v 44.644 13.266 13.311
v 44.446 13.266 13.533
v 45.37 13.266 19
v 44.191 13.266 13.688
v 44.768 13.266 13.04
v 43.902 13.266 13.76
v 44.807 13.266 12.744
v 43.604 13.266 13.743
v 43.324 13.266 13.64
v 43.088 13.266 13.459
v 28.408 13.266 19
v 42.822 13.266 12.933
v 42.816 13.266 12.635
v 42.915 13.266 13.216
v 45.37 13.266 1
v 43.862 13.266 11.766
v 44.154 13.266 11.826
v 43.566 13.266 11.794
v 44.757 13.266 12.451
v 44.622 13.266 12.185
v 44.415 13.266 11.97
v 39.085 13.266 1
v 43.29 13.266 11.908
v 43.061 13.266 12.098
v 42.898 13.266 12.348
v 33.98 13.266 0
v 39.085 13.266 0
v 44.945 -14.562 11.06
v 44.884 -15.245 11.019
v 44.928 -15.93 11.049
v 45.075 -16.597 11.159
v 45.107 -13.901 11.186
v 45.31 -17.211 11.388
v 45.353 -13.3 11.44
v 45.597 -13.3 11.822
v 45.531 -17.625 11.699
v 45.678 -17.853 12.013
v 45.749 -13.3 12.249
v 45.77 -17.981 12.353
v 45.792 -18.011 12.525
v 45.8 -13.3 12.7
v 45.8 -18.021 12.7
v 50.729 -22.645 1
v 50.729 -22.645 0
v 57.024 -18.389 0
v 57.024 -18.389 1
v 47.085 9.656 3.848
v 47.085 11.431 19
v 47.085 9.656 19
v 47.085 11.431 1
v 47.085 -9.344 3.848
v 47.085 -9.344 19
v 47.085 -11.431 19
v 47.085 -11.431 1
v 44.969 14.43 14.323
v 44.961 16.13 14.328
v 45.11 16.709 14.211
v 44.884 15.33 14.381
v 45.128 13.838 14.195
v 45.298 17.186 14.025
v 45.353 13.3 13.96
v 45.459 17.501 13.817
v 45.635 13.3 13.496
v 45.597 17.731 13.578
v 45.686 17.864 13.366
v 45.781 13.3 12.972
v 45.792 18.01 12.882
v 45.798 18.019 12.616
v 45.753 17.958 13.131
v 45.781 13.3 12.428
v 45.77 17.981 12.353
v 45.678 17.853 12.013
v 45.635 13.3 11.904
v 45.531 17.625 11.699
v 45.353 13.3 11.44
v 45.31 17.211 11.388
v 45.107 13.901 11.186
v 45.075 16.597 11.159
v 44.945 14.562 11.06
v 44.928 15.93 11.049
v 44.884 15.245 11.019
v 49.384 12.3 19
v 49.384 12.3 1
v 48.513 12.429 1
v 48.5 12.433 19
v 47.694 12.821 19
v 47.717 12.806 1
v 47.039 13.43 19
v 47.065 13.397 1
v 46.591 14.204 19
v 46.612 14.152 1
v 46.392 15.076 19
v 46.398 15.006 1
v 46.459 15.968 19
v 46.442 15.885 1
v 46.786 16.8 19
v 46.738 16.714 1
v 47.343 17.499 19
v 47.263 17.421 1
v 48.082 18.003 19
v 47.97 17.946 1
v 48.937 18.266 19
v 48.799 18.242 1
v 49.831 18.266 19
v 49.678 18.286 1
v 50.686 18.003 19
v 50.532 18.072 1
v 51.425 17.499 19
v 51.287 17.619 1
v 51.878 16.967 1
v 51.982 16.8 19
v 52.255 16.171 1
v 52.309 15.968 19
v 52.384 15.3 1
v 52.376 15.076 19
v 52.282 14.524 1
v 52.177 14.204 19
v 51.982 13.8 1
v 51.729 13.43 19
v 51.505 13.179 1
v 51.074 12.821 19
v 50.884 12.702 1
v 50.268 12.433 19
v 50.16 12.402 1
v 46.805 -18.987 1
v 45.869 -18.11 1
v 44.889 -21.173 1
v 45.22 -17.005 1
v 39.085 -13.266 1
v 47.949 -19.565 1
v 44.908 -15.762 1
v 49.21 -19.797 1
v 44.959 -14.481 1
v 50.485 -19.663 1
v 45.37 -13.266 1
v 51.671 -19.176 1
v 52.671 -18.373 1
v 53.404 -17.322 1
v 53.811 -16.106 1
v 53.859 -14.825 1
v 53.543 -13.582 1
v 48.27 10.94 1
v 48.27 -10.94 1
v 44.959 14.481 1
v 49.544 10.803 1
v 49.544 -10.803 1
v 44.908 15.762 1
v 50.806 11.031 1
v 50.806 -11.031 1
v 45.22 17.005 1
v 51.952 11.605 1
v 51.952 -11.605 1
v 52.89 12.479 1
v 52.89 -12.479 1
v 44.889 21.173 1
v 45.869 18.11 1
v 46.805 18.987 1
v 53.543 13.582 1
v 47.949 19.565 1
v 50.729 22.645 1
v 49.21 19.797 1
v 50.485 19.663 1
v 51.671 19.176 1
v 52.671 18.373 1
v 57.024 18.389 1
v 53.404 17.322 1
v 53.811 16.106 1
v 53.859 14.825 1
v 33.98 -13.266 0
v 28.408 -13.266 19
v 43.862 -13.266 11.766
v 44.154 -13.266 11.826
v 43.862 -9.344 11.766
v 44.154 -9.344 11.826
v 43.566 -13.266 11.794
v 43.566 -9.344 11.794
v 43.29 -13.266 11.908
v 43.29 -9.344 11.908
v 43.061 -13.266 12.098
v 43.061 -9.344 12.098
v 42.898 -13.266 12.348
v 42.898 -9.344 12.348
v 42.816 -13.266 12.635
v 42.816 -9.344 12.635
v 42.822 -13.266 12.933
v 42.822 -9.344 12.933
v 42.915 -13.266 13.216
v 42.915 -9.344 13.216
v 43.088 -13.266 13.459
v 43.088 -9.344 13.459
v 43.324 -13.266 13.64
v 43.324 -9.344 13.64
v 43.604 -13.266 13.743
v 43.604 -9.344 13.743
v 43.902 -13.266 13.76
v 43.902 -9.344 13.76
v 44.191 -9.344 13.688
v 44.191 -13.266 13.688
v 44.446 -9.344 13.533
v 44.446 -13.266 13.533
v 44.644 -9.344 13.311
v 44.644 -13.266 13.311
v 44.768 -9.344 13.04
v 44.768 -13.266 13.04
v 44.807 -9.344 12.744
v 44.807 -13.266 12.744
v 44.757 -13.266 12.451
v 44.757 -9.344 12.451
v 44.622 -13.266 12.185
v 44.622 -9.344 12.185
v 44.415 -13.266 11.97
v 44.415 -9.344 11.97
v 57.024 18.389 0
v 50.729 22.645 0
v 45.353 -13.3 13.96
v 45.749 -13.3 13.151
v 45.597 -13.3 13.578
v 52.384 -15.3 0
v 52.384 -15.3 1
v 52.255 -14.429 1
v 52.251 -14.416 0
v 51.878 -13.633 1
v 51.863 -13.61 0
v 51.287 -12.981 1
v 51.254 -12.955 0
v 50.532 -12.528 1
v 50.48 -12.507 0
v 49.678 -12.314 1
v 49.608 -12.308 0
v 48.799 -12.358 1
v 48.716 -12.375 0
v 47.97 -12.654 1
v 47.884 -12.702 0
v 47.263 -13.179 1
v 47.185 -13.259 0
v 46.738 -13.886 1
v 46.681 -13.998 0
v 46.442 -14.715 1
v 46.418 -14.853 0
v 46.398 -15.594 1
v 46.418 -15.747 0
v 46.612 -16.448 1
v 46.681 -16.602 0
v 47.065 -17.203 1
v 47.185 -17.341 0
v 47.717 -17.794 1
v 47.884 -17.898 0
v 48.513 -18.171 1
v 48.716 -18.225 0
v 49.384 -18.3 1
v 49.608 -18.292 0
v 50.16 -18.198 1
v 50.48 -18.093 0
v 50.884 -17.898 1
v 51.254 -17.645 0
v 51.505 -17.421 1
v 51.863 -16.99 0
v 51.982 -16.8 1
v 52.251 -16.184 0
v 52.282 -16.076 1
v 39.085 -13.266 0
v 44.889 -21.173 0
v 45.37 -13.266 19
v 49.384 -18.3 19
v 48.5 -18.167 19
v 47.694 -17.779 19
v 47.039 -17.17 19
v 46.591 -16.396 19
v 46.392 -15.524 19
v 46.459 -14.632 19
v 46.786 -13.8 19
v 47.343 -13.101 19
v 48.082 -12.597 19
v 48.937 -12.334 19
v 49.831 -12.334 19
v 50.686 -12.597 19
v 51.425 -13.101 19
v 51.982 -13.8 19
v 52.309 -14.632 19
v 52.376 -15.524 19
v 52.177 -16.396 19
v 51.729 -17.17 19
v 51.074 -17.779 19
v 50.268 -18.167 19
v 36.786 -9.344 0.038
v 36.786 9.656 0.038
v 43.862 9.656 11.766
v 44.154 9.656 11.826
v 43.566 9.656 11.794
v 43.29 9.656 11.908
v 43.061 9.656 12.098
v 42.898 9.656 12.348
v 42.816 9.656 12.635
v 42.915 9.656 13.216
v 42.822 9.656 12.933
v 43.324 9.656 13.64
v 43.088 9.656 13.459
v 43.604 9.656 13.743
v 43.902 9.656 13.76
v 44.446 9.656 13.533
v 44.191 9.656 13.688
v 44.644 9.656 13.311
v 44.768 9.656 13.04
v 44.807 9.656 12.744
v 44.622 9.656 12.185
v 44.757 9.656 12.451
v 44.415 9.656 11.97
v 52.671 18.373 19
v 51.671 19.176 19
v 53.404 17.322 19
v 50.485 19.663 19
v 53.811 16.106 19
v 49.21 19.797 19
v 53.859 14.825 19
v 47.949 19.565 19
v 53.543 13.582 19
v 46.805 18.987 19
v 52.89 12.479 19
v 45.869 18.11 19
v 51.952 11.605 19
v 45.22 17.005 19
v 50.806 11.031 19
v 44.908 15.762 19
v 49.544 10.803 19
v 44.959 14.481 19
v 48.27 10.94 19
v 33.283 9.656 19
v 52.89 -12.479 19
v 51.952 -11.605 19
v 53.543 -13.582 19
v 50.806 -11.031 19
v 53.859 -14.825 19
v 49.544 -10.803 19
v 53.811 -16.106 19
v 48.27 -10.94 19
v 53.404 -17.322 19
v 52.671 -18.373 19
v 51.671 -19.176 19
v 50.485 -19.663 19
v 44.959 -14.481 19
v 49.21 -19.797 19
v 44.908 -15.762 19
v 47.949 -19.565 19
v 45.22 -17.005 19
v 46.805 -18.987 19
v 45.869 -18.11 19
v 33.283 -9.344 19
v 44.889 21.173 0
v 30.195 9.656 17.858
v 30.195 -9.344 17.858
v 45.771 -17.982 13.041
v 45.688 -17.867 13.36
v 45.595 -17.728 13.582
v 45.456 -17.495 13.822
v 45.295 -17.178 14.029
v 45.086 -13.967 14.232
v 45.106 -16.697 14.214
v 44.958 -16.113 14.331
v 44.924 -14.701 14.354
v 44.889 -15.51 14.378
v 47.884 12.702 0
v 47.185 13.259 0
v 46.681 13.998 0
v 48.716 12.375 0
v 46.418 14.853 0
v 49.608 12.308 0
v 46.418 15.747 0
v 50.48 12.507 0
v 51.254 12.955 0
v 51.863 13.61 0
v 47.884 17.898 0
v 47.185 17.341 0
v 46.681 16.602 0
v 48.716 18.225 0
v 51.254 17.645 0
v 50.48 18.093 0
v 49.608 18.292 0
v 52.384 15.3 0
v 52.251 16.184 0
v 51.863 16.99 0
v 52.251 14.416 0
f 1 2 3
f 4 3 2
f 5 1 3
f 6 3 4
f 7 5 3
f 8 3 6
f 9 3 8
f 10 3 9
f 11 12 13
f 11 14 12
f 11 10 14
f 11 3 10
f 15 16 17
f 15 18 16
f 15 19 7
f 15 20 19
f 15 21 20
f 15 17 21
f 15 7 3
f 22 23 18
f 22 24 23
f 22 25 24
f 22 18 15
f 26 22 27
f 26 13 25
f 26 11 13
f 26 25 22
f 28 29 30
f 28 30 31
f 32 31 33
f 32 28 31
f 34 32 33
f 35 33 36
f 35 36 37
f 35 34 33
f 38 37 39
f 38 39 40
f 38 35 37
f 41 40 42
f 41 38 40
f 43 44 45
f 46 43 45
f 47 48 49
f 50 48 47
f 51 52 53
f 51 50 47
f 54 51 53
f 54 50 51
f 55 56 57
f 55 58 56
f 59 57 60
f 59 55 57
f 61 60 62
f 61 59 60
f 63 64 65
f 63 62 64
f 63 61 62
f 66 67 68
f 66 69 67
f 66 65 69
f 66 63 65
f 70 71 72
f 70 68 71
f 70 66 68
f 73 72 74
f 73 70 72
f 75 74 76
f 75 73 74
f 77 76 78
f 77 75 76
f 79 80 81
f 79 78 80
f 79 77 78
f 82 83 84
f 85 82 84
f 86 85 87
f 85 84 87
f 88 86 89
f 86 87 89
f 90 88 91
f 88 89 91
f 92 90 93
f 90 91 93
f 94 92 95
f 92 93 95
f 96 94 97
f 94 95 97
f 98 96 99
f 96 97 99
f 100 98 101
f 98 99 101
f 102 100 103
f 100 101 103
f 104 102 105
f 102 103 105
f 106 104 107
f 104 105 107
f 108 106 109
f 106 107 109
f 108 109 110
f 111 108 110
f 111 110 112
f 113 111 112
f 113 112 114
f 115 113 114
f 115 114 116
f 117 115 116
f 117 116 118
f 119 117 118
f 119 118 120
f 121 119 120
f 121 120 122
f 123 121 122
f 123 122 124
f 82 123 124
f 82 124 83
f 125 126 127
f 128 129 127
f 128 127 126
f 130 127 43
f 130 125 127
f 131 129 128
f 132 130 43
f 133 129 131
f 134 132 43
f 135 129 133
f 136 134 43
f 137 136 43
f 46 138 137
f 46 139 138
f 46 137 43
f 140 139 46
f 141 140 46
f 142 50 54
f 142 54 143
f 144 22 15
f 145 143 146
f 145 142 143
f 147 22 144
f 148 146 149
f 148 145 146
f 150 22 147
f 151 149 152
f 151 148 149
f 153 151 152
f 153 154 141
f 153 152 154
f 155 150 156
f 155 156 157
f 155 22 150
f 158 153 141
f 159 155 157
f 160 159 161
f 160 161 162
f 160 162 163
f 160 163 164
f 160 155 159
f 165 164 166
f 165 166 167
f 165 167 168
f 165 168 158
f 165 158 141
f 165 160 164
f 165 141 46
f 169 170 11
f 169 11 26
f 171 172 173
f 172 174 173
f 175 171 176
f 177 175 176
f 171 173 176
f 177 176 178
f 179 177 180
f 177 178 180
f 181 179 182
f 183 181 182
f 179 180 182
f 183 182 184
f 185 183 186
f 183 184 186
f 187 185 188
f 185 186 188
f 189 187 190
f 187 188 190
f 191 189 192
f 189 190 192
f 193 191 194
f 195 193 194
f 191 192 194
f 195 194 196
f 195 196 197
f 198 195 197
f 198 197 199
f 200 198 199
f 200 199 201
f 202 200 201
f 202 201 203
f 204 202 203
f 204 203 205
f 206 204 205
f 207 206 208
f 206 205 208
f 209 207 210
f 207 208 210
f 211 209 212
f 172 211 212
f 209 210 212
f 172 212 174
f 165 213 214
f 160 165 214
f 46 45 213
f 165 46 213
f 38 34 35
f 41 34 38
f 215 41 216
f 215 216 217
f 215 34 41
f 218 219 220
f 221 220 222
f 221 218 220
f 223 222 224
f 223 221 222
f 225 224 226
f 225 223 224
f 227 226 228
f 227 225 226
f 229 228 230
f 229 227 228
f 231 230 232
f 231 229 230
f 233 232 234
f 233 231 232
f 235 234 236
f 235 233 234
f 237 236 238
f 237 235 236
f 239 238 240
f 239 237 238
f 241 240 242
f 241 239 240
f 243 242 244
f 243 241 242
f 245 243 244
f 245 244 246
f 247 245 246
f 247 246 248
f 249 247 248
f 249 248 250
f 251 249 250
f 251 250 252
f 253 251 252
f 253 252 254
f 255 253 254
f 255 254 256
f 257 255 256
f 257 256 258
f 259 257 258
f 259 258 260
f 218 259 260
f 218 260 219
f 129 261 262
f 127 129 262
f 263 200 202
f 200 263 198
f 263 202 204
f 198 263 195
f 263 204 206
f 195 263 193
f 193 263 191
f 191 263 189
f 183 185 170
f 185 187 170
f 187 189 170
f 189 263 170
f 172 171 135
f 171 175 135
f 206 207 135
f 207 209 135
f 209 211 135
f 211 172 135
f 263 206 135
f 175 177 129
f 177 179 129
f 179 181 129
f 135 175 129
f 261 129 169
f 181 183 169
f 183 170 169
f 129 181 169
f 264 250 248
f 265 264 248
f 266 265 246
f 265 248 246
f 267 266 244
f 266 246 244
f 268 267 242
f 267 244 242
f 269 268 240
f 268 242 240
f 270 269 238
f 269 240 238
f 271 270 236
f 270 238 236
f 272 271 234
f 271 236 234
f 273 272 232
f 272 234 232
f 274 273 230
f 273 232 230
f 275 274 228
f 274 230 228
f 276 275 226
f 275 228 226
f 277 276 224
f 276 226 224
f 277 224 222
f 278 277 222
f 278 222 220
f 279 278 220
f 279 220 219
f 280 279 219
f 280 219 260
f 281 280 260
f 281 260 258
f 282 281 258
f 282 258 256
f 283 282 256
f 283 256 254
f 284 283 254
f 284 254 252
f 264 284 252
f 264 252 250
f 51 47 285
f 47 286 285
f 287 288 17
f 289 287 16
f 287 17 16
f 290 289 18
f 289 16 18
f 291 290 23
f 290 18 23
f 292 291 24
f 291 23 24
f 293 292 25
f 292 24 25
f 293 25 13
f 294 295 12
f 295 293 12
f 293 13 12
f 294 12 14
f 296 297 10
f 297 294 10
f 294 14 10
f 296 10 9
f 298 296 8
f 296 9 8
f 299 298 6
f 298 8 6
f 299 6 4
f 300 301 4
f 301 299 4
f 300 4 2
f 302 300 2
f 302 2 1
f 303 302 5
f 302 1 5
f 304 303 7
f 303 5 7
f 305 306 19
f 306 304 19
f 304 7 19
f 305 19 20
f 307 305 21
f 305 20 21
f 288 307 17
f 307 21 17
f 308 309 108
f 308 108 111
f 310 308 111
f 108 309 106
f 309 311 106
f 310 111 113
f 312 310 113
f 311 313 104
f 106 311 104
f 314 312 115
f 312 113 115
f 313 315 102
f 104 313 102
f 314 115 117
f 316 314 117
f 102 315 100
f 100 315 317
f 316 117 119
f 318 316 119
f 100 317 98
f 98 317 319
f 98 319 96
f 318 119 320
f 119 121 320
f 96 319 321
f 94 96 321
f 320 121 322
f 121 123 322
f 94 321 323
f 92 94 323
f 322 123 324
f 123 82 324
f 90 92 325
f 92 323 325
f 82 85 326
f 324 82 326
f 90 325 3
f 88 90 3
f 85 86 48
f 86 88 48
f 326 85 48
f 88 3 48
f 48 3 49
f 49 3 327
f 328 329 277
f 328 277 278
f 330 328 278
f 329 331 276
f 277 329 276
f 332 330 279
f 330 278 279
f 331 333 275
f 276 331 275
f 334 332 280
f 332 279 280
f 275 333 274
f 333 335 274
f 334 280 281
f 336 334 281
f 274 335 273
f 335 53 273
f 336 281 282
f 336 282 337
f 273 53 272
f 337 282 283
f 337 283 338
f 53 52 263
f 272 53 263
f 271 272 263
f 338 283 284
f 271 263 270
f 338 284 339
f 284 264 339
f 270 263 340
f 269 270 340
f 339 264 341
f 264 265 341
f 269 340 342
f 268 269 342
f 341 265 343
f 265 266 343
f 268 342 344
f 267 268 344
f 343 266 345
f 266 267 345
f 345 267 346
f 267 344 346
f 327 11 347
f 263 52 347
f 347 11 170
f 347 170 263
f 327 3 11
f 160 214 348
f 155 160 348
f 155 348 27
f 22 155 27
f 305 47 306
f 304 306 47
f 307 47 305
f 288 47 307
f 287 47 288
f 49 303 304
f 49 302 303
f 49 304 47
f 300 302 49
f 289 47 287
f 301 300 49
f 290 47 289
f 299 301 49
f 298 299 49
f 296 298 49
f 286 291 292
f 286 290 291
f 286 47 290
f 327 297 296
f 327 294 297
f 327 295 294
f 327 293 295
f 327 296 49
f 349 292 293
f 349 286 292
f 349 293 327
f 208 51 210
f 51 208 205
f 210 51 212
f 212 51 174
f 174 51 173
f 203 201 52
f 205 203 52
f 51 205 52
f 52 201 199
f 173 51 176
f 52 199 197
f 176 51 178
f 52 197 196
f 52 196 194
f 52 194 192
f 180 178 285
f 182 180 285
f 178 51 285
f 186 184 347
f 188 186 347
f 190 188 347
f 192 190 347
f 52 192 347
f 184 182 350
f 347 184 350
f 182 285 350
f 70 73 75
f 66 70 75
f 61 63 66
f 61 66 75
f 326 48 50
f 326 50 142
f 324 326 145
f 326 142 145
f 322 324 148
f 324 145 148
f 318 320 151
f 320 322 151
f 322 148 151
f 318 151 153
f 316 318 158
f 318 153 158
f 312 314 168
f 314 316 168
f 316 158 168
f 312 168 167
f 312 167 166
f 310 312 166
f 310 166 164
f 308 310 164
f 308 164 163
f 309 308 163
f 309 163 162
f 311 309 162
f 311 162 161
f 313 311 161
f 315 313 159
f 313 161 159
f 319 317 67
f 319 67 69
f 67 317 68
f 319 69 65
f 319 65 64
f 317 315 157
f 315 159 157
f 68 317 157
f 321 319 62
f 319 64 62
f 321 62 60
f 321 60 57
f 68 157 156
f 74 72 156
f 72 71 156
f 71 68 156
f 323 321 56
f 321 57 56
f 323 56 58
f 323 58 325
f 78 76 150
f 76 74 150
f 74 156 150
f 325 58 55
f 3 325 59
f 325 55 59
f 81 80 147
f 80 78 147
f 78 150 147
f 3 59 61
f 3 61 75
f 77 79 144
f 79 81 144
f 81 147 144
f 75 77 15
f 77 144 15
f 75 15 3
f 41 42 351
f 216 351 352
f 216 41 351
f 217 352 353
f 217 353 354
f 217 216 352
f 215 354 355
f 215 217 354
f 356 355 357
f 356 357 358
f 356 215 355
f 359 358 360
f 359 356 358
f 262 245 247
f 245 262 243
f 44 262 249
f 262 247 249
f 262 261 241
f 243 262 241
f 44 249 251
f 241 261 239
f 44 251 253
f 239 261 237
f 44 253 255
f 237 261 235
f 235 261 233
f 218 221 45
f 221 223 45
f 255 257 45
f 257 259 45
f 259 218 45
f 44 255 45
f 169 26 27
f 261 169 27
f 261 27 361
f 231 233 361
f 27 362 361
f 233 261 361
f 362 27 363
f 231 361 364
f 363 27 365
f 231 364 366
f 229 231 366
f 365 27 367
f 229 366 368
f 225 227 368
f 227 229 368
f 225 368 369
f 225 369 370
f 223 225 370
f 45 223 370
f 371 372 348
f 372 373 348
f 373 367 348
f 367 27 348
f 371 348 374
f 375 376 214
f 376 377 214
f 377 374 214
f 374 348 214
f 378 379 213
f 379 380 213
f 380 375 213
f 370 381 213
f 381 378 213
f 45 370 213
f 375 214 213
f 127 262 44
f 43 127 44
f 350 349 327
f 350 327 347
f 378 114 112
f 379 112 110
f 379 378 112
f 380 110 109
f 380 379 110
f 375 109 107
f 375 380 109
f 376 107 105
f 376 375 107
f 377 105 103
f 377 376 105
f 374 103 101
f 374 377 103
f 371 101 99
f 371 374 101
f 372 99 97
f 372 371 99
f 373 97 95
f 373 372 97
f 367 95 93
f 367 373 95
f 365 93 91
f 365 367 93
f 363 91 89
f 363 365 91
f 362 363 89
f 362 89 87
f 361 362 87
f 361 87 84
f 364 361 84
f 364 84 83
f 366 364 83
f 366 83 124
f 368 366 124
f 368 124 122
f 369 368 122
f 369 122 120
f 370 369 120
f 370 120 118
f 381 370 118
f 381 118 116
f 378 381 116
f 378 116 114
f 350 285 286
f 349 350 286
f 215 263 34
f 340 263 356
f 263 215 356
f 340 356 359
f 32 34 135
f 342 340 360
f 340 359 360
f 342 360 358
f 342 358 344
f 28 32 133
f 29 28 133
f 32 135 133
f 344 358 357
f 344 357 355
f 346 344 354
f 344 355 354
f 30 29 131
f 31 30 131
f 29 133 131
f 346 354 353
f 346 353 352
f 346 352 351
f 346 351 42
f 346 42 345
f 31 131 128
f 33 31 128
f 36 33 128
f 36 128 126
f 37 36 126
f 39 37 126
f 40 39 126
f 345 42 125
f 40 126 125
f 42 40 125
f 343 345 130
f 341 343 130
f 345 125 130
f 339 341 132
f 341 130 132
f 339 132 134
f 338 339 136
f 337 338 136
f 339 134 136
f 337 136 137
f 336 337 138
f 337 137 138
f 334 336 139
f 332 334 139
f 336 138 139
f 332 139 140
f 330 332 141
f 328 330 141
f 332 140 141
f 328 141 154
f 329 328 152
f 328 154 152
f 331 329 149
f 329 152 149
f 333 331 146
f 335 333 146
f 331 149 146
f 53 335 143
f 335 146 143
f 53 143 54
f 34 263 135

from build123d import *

# Parameters (mm, degrees)
CYLINDER001_R           = 2
CYLINDER001_DEPTH       = 10
CYLINDER_R              = 2
CYLINDER_DEPTH          = 10
PAD007_DEPTH            = 17
SKETCH002_W             = 19
SKETCH002_H             = 19
PAD002_DEPTH            = 11
SKETCH003_R             = 1
PAD003_DEPTH            = 27
PAD003_FACE5_W          = 19
PAD003_FACE5_H          = 19
PAD004_DEPTH            = 24
BODY001_PLACEMENT_ANGLE = 159.7
SKETCH_R                = 3
PAD_DEPTH               = 1
SKETCH001_R             = 4.5
PAD001_DEPTH            = 18
PAD001_FACE25_R         = 3
POCKET_DEPTH            = 22
POCKET_FACE26_R         = 3
POCKET001_DEPTH         = 31
POCKET001_FACE18_W      = 13.265998
POCKET001_FACE18_H      = 18
PAD005_DEPTH            = 8
PAD005_FACE17_W         = 13.265998
PAD005_FACE17_H         = 18
PAD006_DEPTH            = 8


with BuildPart() as cylinder001:
    # Cylinder001 → Cylinder001 (new body)
    with BuildSketch(Plane(origin=(43.8, 13.3, 12.7), x_dir=(-1, 0, 0), z_dir=(0, 1, 0))):
        Circle(CYLINDER001_R)
    extrude(amount=CYLINDER001_DEPTH)


with BuildPart() as cylinder:
    # Cylinder → Cylinder (new body)
    with BuildSketch(Plane(origin=(43.8, -13.3, 12.7), x_dir=(1, 0, 0), z_dir=(0, -1, 0))):
        Circle(CYLINDER_R)
    extrude(amount=CYLINDER_DEPTH)


with BuildPart() as body002:
    # Sketch005 → Pad007 (new body, symmetric)
    with BuildSketch(Plane.XZ):
        Polygon((21.007471, 20.364401), (29.359247, -8.113389), (3.411231, -3.850644), (-10.027989, 26.995327), align=None)
    extrude(amount=PAD007_DEPTH, both=True)


with BuildPart() as body002_1:
    # Body002 placement: moved
    add(body002.part.moved(Location((7, 0, 0))))


with BuildPart() as body001:
    # Sketch002 → Pad002 (new body)
    with BuildSketch(Plane.YZ):
        with Locations((0.156277, 39.976883)):
            Rectangle(SKETCH002_W, SKETCH002_H)
    extrude(amount=PAD002_DEPTH)

    # Sketch003 (on Face2 of Pad002) → Pad003 (join, symmetric)
    with BuildSketch(Plane.ZX.offset(9.656277)):
        with Locations((39.976883, 0)):
            Circle(SKETCH003_R)
    extrude(amount=PAD003_DEPTH, both=True)

    # Pad003 Face5 → Pad004 (add)
    with BuildSketch(Plane(origin=(11, 0.156277, 39.976883), x_dir=(0, -1, 0), z_dir=(1, 0, 0))):
        Rectangle(PAD003_FACE5_W, PAD003_FACE5_H)
    extrude(amount=-PAD004_DEPTH)


with BuildPart() as body001_1:
    # Body001 placement: moved
    add(body001.part.moved(Location((29.937834, 0, 50.257929))).rotate(Axis((29.937834, 0, 50.257929), (0, 1, 0)), BODY001_PLACEMENT_ANGLE))


with BuildPart() as cut003:
    # Sketch → Pad (new body)
    with BuildSketch(Plane.XY):
        Polygon((61.12867, 22.644966), (55.288719, 21.173481), (49.485474, 13.265998), (24.71945, 13.265998), (24.71945, 0), (24.71945, -13.265998), (49.485474, -13.265998), (55.288719, -21.173481), (61.12867, -22.644966), (67.424286, -18.389174), (67.424286, 0), (67.424286, 18.389174), align=None)
        with Locations((59.784004, 15.3)):
            Circle(SKETCH_R, mode=Mode.SUBTRACT)
        with Locations((59.784004, -15.3)):
            Circle(SKETCH_R, mode=Mode.SUBTRACT)
    extrude(amount=PAD_DEPTH)

    # Sketch001 (on Face16 of Pad) → Pad001 (join)
    with BuildSketch(Plane.XY.offset(1)):
        with Locations((59.784004, 15.3)):
            Circle(SKETCH001_R)
        with Locations((59.784004, -15.3)):
            Circle(SKETCH001_R)
        Polygon((24.71945, 0), (24.71945, 13.265998), (49.485474, 13.265998), (49.485474, 0), (49.485474, -13.265998), (24.71945, -13.265998), align=None)
    extrude(amount=PAD001_DEPTH)

    # Pad001 Face25 → Pocket (cut)
    with BuildSketch(Plane(origin=(59.784004, -15.3, 1), x_dir=(0, -1, 0), z_dir=(0, 0, -1))):
        Circle(PAD001_FACE25_R)
    extrude(amount=-POCKET_DEPTH, mode=Mode.SUBTRACT)

    # Pocket Face26 → Pocket001 (cut)
    with BuildSketch(Plane(origin=(59.784004, 15.3, 1), x_dir=(0, -1, 0), z_dir=(0, 0, -1))):
        Circle(POCKET_FACE26_R)
    extrude(amount=-POCKET001_DEPTH, mode=Mode.SUBTRACT)

    # Pocket001 Face18 → Pad005 (add)
    with BuildSketch(Plane(origin=(49.485474, 6.632999, 10), x_dir=(0, -1, 0), z_dir=(1, 0, 0))):
        Rectangle(POCKET001_FACE18_W, POCKET001_FACE18_H)
    extrude(amount=PAD005_DEPTH)

    # Pad005 Face17 → Pad006 (add)
    with BuildSketch(Plane(origin=(49.485474, -6.632999, 10), x_dir=(0, -1, 0), z_dir=(1, 0, 0))):
        Rectangle(PAD005_FACE17_W, PAD005_FACE17_H)
    extrude(amount=PAD006_DEPTH)


with BuildPart() as cut003_1:
    # Body placement: moved
    add(cut003.part.moved(Location((-10.4, 0, 0))))

    # Cut: cut Body001
    add(body001_1.part, mode=Mode.SUBTRACT)

    # Cut001: cut Body002
    add(body002_1.part, mode=Mode.SUBTRACT)

    # Cut002: cut Cylinder
    add(cylinder.part, mode=Mode.SUBTRACT)

    # Cut003: cut Cylinder001
    add(cylinder001.part, mode=Mode.SUBTRACT)


solid = cut003_1.part
